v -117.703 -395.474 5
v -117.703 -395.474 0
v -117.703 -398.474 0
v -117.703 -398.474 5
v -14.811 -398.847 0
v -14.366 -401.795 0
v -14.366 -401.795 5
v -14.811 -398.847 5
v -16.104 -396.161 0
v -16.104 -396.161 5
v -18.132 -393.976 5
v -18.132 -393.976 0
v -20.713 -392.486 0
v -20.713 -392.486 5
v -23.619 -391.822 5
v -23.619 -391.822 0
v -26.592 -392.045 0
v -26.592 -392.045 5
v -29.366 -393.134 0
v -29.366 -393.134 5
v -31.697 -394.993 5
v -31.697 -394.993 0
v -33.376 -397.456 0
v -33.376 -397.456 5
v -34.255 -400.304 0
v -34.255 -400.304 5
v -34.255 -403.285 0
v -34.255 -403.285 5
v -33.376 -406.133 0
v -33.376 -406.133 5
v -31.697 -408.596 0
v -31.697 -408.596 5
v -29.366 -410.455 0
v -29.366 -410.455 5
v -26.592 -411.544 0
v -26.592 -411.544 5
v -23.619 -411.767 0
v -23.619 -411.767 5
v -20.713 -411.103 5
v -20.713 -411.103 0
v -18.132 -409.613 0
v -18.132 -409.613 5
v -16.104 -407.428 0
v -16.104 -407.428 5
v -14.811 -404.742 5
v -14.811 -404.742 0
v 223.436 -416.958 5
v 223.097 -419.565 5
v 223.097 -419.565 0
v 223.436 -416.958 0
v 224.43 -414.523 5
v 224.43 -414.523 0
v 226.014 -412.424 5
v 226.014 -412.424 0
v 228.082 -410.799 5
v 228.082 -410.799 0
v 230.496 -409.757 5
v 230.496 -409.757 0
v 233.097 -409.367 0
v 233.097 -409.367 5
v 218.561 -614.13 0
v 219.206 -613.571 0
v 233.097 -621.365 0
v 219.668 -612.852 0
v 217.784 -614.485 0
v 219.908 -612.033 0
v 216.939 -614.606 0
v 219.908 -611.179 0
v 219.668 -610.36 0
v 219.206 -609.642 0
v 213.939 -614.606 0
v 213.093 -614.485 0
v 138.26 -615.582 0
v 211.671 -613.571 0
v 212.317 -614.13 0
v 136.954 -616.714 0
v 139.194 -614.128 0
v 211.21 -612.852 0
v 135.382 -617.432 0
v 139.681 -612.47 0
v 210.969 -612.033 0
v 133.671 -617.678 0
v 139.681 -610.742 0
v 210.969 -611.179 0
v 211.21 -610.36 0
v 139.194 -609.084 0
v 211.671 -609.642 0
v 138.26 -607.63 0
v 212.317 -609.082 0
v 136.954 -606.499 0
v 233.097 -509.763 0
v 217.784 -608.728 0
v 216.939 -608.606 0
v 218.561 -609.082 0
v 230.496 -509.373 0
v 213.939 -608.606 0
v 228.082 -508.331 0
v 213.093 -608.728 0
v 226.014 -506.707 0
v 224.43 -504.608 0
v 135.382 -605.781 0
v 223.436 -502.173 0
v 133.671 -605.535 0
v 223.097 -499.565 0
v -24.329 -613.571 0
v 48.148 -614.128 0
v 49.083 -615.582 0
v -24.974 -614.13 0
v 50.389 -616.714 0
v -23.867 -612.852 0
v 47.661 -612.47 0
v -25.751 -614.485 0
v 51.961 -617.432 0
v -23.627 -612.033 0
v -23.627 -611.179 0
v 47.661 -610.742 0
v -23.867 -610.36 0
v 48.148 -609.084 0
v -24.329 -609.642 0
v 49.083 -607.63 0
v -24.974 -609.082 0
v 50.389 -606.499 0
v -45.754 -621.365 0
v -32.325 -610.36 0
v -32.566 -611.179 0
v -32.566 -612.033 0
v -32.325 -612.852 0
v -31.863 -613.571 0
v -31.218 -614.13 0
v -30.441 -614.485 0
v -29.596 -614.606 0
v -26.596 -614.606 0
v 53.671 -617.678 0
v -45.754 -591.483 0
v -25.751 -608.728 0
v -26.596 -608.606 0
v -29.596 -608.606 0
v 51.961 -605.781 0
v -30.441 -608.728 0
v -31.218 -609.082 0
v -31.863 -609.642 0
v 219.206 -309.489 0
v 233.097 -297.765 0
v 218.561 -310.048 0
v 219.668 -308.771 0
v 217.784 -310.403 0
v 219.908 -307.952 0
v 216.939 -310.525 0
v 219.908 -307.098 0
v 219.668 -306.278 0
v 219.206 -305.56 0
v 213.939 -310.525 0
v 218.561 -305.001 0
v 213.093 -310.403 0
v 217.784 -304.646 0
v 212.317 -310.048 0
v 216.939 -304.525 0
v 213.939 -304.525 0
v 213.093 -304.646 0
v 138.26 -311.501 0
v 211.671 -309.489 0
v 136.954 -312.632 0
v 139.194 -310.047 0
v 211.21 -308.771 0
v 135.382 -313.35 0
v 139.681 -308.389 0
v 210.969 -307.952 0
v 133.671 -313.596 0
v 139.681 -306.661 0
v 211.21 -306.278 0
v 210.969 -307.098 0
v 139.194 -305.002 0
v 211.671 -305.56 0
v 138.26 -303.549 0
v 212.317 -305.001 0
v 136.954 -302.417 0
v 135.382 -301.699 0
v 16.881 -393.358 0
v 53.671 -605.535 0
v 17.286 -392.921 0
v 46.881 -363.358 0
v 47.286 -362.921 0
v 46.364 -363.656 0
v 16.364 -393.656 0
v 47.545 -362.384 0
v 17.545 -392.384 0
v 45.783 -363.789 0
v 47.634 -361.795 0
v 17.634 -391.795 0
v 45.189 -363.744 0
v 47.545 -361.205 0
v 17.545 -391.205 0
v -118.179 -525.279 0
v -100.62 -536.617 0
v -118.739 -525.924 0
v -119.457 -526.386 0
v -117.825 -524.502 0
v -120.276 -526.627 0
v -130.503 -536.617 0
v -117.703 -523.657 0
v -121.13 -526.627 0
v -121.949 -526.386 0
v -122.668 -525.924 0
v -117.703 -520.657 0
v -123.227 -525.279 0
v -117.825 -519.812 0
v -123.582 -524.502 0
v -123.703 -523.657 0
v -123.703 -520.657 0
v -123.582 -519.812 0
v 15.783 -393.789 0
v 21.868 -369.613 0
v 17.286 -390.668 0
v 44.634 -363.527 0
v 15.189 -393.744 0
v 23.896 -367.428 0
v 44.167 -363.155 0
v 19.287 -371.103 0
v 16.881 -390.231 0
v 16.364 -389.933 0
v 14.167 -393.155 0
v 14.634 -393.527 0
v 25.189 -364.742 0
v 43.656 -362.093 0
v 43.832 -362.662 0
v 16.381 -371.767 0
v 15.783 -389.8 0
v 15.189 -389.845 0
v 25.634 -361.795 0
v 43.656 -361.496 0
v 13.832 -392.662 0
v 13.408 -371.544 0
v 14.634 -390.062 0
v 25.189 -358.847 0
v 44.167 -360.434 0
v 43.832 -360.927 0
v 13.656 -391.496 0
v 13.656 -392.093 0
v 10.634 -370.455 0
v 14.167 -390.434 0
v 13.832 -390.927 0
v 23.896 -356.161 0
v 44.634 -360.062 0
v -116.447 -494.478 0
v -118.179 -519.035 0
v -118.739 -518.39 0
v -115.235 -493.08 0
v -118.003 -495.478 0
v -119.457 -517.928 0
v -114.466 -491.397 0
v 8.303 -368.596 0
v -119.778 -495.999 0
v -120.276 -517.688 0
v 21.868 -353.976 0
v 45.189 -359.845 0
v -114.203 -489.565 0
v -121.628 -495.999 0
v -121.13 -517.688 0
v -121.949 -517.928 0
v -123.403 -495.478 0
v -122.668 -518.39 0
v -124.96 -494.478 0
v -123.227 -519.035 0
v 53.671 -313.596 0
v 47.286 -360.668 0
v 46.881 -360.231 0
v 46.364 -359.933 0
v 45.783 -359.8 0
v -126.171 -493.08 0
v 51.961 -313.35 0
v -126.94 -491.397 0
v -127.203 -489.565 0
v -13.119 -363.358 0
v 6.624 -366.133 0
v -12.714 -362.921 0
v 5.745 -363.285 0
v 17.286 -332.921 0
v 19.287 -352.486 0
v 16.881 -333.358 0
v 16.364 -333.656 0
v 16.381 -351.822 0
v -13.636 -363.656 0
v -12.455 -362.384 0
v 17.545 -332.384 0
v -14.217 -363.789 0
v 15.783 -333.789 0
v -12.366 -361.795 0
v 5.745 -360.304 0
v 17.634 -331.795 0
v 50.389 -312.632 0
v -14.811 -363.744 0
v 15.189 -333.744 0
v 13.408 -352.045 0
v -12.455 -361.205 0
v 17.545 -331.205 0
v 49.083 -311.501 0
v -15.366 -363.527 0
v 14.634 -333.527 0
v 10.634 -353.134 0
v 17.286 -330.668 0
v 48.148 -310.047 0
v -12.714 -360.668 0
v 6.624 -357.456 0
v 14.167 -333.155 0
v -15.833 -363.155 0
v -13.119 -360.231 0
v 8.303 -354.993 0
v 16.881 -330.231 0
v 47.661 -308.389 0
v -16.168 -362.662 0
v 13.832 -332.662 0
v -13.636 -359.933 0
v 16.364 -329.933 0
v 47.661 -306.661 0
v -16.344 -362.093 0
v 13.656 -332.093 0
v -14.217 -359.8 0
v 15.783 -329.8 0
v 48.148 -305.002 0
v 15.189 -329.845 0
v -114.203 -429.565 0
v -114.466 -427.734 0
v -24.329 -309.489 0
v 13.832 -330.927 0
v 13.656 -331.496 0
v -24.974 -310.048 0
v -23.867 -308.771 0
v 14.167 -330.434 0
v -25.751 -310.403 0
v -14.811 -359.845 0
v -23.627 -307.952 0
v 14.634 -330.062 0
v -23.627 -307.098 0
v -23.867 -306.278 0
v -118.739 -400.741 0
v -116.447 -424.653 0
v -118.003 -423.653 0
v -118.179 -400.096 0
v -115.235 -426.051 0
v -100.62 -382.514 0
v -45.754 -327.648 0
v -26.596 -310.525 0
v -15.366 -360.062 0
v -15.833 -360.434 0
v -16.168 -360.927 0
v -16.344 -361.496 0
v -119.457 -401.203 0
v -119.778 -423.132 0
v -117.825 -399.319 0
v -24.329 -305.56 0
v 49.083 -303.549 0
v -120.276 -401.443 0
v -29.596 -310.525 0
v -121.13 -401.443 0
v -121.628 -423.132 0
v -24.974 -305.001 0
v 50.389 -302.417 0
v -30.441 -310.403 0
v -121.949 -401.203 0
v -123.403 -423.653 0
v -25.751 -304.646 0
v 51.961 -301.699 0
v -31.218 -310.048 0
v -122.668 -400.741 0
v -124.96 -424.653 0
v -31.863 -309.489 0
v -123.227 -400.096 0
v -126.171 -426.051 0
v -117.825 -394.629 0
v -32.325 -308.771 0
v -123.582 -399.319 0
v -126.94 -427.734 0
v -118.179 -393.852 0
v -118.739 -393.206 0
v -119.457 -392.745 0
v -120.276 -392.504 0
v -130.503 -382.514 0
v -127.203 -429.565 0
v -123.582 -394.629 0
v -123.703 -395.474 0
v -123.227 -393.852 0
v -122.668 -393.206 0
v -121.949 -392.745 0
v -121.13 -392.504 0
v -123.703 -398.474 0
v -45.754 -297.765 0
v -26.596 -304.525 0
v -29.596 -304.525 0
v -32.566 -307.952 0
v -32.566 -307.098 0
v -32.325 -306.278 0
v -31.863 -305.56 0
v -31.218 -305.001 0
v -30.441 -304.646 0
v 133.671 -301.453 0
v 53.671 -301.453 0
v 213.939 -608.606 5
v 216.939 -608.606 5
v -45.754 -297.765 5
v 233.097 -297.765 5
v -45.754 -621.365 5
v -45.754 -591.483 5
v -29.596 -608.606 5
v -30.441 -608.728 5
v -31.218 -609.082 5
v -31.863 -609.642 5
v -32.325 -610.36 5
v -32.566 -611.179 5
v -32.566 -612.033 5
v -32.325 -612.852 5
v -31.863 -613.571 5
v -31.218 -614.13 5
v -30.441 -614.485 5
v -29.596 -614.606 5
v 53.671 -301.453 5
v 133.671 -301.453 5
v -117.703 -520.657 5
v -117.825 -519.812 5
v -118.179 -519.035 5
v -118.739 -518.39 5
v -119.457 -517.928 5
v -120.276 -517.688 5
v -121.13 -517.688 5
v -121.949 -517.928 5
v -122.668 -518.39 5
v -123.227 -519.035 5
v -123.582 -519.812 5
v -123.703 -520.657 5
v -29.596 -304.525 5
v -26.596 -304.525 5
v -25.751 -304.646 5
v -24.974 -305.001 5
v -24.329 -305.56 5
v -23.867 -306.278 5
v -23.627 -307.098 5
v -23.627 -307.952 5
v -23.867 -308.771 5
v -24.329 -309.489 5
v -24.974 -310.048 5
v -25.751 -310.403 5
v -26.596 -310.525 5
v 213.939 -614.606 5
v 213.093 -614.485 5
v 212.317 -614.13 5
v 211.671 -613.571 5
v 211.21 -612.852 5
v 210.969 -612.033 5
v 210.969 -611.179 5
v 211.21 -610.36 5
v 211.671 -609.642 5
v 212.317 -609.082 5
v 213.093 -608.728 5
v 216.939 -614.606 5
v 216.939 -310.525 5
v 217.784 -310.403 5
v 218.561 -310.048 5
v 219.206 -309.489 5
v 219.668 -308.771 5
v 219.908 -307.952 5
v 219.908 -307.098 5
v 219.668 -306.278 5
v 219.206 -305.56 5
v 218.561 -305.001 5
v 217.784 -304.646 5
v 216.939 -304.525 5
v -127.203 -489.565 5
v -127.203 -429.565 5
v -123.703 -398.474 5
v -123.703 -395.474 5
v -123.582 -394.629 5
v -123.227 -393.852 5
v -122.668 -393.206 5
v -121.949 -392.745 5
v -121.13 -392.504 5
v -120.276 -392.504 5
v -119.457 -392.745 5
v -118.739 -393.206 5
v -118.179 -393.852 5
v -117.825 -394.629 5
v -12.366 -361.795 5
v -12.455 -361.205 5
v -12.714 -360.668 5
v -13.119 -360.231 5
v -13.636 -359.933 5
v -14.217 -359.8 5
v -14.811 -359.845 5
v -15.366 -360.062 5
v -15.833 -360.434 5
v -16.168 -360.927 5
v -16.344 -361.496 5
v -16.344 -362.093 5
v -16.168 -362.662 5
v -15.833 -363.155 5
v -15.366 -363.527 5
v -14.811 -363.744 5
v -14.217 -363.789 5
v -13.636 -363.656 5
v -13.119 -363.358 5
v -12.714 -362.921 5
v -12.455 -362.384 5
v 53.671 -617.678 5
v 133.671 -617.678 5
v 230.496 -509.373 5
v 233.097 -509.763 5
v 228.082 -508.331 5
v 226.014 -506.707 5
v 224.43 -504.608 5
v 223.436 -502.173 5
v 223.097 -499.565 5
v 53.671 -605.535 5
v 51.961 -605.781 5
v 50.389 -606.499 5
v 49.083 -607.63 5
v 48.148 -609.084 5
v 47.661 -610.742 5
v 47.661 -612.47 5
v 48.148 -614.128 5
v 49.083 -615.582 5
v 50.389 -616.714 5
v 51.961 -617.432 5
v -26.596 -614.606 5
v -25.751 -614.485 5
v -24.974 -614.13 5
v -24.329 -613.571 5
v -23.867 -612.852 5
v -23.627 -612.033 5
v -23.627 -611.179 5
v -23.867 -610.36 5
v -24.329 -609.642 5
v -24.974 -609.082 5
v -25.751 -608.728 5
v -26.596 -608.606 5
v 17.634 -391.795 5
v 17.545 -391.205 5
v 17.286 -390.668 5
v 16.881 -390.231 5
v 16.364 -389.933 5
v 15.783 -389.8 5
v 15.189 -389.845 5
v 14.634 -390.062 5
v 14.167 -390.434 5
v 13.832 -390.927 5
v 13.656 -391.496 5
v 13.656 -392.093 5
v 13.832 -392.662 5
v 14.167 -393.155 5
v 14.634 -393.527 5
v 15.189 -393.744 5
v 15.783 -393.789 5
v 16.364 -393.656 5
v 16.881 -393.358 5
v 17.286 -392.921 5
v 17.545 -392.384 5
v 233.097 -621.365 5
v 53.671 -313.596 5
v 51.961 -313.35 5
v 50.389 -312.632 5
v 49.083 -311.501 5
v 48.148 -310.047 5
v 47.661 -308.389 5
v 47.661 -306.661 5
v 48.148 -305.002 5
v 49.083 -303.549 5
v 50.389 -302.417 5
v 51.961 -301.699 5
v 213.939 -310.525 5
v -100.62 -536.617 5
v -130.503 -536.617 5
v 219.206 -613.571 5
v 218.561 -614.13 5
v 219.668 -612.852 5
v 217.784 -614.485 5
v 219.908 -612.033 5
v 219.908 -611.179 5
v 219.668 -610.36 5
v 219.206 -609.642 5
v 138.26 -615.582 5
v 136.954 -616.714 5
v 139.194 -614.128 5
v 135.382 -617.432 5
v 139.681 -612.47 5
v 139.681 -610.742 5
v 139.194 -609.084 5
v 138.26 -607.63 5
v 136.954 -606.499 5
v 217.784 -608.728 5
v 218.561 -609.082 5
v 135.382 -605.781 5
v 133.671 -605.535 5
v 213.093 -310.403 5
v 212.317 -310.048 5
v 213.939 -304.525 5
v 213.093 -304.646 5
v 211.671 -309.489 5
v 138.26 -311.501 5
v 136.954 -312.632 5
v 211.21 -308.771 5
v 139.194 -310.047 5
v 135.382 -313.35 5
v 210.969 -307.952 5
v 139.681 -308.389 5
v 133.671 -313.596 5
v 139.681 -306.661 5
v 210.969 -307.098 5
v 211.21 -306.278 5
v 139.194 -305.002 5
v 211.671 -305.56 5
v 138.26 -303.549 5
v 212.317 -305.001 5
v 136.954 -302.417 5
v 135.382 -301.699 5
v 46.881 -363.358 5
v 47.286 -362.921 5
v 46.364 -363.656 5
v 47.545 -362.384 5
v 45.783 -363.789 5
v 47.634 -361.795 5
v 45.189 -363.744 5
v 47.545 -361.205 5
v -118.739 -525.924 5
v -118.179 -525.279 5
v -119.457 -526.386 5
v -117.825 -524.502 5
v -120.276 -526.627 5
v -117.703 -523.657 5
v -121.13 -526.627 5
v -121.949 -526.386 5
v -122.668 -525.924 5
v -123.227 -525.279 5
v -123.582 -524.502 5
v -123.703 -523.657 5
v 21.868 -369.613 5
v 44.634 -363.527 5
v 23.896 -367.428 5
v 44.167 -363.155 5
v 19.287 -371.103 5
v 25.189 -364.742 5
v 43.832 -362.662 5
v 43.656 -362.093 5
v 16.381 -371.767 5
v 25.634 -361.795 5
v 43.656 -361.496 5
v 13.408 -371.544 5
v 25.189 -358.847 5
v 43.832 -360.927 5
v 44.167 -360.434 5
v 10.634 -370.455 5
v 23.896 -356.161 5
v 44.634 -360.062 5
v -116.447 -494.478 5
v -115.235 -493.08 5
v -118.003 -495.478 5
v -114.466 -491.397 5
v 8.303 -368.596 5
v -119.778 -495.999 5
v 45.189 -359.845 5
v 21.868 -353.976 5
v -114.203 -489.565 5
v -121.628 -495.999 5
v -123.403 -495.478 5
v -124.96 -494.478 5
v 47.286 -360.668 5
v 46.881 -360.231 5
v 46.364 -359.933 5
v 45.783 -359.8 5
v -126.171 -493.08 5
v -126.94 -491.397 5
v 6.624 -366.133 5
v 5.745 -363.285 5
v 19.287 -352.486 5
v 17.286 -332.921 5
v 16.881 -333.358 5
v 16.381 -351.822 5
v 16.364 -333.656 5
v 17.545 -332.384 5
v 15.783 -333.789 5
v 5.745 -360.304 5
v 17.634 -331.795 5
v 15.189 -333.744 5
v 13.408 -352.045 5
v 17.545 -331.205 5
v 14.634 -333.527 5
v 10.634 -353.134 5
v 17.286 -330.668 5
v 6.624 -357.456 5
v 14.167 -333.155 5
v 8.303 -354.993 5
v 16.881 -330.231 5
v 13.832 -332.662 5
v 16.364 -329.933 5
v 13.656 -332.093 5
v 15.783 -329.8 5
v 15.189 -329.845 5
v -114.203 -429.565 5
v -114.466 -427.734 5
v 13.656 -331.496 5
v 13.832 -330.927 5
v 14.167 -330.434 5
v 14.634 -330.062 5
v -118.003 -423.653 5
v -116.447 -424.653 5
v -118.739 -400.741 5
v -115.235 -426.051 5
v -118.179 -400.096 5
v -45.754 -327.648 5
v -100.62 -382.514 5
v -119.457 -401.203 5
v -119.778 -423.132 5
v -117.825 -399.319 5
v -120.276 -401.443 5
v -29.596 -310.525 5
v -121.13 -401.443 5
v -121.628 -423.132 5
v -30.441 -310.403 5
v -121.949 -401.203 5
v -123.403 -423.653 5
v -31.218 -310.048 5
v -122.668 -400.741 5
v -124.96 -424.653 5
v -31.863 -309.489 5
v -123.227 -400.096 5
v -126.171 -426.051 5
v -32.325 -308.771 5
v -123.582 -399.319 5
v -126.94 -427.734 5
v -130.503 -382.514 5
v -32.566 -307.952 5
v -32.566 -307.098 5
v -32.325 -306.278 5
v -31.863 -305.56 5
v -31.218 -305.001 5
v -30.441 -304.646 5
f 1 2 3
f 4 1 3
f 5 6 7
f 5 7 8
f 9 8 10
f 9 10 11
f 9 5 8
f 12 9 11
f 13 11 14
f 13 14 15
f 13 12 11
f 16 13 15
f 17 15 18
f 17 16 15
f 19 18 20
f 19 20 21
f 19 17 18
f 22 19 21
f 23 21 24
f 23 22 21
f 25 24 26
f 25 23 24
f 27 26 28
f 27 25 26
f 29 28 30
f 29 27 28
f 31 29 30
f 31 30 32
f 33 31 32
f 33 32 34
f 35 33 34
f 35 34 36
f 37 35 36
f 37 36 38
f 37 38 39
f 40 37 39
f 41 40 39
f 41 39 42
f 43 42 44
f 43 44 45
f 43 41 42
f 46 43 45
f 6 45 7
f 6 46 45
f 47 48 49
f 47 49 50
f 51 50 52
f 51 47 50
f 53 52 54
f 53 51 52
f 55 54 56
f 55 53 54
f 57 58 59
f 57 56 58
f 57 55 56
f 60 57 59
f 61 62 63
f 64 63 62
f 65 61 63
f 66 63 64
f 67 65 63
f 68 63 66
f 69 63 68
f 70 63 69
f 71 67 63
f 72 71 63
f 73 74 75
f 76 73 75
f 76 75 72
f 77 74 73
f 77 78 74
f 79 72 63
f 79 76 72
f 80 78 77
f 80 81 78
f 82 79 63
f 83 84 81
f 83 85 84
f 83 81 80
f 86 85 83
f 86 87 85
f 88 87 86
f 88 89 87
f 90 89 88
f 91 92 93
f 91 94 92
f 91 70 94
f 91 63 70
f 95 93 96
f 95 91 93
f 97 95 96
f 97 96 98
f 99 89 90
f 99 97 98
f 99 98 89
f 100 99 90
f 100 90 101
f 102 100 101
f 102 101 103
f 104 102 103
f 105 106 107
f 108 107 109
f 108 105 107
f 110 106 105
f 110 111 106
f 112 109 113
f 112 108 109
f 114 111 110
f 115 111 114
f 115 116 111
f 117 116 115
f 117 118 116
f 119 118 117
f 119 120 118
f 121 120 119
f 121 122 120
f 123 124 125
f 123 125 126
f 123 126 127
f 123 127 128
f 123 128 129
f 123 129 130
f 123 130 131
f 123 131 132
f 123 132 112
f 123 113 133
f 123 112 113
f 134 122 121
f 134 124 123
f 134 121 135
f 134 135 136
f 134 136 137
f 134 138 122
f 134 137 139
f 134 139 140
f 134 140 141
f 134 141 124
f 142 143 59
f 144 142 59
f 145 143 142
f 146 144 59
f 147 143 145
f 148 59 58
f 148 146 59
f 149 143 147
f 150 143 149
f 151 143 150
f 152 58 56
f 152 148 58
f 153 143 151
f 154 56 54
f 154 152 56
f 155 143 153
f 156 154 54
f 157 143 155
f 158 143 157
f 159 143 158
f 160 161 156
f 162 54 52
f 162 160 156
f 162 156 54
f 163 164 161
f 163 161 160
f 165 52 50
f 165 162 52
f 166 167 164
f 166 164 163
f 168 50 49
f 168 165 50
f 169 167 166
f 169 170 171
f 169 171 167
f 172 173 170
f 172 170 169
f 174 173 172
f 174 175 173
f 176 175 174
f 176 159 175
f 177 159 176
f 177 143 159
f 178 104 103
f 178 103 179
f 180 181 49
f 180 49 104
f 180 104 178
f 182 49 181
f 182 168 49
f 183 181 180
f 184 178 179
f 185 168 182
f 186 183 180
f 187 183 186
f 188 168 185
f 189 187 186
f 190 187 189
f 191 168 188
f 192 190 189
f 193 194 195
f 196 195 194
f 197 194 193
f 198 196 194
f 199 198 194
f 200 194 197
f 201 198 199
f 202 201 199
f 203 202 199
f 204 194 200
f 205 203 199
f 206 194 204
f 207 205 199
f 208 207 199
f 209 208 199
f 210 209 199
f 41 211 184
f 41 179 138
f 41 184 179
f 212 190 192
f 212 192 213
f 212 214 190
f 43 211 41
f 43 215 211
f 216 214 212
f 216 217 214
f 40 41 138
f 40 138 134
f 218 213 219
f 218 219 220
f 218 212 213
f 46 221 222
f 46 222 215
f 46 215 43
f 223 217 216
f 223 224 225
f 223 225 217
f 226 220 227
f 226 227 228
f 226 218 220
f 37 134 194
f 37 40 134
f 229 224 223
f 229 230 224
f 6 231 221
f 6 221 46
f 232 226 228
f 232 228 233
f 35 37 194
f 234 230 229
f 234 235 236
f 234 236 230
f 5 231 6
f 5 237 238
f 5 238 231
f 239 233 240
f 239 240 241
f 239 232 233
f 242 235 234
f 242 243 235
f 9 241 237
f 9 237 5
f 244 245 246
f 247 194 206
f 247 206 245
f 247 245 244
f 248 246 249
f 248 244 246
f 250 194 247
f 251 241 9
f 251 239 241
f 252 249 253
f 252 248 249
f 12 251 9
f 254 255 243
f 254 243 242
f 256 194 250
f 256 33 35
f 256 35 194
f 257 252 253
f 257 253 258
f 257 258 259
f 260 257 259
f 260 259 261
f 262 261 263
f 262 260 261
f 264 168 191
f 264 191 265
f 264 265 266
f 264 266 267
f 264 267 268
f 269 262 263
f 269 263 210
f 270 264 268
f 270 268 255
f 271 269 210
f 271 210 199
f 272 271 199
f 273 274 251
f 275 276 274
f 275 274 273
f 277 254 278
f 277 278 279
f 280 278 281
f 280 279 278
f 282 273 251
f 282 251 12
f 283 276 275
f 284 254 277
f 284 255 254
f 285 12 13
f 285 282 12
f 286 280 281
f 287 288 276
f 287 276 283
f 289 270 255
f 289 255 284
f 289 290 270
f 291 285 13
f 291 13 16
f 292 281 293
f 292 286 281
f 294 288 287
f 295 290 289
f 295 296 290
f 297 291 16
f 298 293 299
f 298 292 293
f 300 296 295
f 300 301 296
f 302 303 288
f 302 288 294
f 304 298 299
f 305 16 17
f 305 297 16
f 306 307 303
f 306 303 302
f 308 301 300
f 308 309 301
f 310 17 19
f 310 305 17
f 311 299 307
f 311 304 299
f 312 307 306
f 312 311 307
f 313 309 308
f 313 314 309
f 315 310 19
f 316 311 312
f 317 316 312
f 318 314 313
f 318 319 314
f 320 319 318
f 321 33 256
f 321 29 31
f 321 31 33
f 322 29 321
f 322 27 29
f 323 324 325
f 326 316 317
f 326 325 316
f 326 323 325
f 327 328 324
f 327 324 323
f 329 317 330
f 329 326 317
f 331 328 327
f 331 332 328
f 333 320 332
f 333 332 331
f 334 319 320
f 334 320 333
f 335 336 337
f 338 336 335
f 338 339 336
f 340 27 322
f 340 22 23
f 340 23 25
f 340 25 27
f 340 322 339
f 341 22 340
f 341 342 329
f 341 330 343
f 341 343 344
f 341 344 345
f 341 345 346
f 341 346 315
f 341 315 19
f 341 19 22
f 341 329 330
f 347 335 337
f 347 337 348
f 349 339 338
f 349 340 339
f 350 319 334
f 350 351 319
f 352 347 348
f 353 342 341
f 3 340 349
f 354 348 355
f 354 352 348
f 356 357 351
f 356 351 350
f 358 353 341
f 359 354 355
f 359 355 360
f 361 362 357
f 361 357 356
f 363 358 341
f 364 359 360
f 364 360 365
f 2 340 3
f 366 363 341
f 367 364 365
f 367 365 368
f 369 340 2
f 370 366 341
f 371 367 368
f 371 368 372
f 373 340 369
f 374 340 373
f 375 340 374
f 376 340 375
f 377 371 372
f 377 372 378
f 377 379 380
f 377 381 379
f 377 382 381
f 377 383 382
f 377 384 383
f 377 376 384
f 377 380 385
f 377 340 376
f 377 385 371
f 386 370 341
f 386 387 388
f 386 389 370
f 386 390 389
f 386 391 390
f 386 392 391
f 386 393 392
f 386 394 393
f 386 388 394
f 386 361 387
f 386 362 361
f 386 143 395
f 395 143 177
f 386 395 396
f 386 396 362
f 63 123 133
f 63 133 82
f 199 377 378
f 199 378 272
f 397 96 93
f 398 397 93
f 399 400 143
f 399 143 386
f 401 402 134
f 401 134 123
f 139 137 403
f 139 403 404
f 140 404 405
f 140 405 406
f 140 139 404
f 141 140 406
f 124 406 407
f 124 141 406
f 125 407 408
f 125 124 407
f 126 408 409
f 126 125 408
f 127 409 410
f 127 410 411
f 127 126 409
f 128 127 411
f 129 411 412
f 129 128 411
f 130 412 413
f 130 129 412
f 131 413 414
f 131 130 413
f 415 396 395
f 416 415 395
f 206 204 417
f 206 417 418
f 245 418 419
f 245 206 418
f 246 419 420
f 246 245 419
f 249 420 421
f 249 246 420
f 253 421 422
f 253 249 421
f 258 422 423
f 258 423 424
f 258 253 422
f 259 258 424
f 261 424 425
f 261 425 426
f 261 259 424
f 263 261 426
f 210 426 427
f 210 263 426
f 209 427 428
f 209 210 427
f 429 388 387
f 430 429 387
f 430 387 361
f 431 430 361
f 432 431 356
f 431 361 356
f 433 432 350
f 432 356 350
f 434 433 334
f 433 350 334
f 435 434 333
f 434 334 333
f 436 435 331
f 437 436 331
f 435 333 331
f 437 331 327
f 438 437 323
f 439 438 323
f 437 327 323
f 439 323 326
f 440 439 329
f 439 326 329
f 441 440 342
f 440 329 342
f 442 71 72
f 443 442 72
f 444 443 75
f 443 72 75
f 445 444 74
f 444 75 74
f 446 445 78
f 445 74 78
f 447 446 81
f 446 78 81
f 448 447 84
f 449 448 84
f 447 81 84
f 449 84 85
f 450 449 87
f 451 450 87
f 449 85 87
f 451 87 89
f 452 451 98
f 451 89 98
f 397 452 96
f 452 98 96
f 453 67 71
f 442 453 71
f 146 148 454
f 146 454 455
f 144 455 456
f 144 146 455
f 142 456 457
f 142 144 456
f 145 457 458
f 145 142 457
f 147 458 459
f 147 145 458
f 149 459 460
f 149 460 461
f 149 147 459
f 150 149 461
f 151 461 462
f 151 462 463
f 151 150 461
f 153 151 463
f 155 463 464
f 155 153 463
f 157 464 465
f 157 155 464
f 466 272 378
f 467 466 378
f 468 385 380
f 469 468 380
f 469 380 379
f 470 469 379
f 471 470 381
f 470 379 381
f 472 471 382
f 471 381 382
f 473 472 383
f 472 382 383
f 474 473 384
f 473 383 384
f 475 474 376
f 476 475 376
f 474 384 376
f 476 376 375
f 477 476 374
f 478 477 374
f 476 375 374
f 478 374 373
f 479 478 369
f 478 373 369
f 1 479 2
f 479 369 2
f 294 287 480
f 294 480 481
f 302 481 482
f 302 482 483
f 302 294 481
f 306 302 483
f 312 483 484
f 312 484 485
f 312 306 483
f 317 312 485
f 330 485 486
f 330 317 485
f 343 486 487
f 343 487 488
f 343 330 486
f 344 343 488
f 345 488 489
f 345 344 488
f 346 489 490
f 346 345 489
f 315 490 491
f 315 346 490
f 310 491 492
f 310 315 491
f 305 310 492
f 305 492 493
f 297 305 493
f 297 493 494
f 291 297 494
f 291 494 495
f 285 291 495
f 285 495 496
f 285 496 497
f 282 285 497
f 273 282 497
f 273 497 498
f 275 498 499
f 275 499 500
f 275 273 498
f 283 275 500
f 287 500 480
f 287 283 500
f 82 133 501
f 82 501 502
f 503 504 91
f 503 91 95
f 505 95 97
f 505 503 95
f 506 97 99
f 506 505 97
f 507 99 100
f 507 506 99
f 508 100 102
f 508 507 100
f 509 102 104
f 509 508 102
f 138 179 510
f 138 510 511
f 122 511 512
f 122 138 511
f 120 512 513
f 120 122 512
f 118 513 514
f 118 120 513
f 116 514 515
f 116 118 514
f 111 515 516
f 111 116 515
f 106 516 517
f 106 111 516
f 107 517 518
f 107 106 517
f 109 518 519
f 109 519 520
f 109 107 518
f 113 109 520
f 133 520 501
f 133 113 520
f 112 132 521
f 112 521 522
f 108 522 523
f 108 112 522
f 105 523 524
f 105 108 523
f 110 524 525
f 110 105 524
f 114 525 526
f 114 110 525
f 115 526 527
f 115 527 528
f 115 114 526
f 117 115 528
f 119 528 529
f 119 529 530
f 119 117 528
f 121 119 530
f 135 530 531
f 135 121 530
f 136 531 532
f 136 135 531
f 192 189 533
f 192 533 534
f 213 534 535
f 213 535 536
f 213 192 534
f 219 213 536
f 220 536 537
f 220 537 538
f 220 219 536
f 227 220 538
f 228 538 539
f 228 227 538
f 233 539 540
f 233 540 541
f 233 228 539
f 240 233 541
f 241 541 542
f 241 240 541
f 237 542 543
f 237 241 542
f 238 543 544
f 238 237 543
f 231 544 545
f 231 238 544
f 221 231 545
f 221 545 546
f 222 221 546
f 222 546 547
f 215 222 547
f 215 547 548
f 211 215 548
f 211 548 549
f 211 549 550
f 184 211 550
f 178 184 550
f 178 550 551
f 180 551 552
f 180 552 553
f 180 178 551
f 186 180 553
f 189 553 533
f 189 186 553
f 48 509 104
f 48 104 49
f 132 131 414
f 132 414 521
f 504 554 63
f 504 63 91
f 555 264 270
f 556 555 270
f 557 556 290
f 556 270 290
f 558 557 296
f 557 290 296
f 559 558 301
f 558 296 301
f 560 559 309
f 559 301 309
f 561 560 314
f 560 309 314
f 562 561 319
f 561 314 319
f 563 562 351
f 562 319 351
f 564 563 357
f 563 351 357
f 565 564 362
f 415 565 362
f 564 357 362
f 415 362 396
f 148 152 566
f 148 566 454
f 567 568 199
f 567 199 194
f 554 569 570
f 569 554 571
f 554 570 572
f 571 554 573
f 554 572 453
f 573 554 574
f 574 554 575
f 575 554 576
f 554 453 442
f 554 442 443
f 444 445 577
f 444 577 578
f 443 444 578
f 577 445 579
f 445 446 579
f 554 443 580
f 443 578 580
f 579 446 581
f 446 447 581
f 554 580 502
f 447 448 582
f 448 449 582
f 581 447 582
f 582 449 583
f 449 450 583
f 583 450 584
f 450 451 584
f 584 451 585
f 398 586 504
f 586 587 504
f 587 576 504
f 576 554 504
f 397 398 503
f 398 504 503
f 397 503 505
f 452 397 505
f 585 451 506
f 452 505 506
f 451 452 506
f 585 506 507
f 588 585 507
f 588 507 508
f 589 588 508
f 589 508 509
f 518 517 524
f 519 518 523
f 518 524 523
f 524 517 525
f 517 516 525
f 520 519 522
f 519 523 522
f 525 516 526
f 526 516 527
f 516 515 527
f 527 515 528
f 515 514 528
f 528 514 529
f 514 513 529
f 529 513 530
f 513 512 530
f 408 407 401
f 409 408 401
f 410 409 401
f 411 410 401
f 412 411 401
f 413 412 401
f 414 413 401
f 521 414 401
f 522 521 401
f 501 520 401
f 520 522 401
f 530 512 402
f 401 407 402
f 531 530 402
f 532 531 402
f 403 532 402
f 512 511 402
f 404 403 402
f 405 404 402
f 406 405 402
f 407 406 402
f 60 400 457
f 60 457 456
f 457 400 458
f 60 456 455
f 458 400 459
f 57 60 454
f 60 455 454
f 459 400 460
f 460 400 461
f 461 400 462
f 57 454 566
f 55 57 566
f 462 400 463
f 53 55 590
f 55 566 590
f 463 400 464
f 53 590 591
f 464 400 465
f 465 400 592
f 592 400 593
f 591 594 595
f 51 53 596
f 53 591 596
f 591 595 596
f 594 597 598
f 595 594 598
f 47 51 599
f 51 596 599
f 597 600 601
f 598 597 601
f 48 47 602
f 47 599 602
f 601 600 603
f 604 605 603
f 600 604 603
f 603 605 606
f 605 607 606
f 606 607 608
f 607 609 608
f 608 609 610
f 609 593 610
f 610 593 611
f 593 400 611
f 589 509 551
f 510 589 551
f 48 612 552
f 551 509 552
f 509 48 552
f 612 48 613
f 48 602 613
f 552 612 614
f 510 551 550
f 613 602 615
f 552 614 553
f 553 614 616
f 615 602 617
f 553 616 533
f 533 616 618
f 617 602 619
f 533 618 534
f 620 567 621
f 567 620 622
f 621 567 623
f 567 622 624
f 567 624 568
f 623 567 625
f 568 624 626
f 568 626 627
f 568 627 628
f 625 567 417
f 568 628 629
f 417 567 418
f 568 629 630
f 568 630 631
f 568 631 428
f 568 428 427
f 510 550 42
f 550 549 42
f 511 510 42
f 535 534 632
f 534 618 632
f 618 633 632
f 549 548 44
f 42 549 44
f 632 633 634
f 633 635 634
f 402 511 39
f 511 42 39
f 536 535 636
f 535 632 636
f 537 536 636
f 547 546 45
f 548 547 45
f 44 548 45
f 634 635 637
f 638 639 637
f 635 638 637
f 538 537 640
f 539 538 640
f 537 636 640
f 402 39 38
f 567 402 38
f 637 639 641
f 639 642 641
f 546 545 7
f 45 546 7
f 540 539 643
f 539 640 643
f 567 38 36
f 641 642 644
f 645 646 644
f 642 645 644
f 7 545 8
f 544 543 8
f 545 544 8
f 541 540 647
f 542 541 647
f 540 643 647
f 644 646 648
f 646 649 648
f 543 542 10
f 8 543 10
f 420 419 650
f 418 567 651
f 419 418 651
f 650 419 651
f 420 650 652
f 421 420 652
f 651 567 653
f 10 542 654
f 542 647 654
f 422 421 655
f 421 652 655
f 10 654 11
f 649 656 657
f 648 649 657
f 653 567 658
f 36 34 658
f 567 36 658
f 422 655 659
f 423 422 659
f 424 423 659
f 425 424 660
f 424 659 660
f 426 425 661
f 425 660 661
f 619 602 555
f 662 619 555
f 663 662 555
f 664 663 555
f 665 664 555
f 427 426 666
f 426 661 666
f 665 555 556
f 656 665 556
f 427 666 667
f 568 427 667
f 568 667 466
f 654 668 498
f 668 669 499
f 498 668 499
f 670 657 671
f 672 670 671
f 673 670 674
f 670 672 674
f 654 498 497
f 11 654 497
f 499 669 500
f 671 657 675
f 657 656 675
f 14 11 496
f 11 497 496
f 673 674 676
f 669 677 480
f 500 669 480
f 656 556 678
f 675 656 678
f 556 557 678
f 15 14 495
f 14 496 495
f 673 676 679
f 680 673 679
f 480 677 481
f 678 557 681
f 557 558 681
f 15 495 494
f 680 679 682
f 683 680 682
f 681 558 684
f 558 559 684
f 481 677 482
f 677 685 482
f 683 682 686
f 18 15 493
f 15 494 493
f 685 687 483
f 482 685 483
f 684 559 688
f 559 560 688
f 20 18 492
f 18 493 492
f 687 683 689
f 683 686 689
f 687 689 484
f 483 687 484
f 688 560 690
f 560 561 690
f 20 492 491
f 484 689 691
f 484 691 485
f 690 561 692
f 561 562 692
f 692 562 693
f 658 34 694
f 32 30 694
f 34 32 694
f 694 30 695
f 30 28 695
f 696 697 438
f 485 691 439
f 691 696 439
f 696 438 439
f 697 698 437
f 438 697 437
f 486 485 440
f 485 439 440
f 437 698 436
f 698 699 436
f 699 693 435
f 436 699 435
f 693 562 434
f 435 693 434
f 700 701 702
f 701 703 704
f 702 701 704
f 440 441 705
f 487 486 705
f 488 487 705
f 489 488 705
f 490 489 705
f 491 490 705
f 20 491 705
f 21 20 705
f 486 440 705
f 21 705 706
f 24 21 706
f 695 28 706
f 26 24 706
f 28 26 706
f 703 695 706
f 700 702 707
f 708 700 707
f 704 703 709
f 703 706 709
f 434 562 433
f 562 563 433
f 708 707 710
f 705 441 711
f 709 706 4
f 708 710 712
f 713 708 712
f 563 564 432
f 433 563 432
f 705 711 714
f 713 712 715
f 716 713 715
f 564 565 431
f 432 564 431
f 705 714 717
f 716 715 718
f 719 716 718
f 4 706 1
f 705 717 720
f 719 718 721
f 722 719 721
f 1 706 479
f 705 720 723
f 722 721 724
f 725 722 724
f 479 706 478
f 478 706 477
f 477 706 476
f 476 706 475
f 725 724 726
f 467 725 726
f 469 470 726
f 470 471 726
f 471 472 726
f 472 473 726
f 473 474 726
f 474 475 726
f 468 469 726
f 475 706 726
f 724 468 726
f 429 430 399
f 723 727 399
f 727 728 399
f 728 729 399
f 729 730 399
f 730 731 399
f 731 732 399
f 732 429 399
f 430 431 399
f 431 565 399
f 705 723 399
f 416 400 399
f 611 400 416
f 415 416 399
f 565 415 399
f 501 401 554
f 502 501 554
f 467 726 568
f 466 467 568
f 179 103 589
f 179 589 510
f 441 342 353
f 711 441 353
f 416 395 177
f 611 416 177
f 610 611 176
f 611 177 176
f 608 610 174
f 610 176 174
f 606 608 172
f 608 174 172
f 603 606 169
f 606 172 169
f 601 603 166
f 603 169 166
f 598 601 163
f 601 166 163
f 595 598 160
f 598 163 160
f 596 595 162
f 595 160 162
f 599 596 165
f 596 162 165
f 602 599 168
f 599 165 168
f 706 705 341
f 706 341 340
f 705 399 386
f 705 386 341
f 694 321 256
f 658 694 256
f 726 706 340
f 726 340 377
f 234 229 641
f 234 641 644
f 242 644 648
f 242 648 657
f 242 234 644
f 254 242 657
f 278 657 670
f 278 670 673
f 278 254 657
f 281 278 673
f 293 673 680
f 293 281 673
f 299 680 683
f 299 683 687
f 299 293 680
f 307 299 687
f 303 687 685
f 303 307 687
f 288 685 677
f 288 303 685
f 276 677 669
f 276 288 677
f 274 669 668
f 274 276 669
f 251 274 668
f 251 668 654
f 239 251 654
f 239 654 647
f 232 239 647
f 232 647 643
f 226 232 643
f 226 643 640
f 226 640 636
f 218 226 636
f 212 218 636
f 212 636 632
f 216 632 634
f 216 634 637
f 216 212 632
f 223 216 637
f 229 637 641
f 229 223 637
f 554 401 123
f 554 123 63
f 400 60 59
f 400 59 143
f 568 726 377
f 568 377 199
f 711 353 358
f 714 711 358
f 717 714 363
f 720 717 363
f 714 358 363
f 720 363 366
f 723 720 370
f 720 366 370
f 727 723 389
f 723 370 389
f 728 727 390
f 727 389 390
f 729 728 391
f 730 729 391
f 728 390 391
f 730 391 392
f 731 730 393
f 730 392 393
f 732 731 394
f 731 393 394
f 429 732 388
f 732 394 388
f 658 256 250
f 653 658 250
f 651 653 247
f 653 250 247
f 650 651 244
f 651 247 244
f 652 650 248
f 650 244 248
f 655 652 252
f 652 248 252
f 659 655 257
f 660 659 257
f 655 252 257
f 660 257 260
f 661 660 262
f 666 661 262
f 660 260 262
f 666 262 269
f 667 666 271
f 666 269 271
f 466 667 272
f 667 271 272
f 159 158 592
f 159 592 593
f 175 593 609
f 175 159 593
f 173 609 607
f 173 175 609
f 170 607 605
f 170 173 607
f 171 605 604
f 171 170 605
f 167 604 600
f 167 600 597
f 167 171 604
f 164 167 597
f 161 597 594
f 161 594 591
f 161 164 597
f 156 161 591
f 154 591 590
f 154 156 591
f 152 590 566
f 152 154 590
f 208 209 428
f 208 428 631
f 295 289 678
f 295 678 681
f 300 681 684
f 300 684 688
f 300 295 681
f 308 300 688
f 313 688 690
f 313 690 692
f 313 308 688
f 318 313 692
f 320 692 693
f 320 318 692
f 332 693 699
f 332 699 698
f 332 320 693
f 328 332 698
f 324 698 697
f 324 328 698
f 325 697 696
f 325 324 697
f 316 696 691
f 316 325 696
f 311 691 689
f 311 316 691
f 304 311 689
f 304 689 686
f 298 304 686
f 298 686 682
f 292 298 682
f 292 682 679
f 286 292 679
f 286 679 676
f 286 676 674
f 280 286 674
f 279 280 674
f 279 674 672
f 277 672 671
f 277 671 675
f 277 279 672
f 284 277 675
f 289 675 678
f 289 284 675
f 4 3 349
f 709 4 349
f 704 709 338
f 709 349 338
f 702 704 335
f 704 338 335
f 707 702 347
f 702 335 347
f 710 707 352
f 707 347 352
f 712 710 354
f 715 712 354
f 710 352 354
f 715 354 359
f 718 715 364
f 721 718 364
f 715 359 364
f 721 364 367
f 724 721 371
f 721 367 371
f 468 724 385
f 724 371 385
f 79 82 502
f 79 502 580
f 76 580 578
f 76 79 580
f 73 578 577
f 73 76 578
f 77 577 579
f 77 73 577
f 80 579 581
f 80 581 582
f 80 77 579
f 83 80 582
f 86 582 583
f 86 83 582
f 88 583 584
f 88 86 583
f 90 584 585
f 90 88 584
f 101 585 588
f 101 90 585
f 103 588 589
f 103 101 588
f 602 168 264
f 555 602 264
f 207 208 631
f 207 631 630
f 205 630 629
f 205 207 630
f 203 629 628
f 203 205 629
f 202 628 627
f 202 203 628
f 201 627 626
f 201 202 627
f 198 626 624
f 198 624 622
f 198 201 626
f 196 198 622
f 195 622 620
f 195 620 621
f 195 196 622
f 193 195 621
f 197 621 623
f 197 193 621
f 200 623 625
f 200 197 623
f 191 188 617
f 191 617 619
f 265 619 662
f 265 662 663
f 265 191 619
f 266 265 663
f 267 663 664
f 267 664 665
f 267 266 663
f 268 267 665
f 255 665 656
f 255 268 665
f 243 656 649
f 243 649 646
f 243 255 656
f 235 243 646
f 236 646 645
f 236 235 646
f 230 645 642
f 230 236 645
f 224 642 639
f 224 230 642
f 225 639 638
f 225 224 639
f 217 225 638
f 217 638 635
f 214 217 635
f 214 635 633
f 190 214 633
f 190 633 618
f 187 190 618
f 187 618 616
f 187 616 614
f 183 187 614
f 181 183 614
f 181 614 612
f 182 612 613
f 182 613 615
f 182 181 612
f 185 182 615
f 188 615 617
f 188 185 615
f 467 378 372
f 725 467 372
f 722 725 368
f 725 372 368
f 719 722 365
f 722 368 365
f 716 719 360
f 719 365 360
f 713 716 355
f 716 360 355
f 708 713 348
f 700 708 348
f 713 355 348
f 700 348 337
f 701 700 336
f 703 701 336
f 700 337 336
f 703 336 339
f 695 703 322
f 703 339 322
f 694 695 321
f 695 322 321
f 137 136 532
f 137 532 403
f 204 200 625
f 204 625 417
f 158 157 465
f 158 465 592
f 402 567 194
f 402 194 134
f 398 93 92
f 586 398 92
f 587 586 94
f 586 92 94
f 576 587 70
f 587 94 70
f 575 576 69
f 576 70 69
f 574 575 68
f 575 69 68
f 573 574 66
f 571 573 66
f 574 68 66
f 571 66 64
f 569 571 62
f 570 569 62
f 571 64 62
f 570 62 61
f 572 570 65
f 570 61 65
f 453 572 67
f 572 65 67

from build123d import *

# Parameters (mm, degrees)
SKETCH2_R           = 2
SKETCH2_R_2         = 10
BOSS_EXTRUDE6_DEPTH = 5
CUT_EXTRUDE9_DEPTH  = 10


with BuildPart() as part:
    # Sketch2 → Boss-Extrude6 (new body)
    with BuildSketch(Plane.XY):
        with BuildLine():
            Line((-130.703145502, -382.314175973), (-100.703145502, -382.314175973))
            Line((-100.703145502, -382.314175973), (-45.95440816, -327.565438631))
            Line((-45.95440816, -327.565438631), (-45.95440816, -297.565438631))
            Line((-45.95440816, -297.565438631), (233.296854498, -297.565438631))
            Line((233.296854498, -297.565438631), (233.296854498, -409.565438631))
            ThreePointArc((233.296854498, -409.565438631), (226.225786687, -412.494370819), (223.296854498, -419.565438631))
            Line((223.296854498, -419.565438631), (223.296854498, -499.565438631))
            ThreePointArc((223.296854498, -499.565438631), (226.225786687, -506.636506443), (233.296854498, -509.565438631))
            Line((233.296854498, -509.565438631), (233.296854498, -621.565438631))
            Line((233.296854498, -621.565438631), (-45.95440816, -621.565438631))
            Line((-45.95440816, -621.565438631), (-45.95440816, -591.565438631))
            Line((-45.95440816, -591.565438631), (-100.703145502, -536.81670129))
            Line((-100.703145502, -536.81670129), (-130.703145502, -536.81670129))
            Line((-130.703145502, -536.81670129), (-130.703145502, -382.314175973))
        make_face()
        with Locations((15.633601358, -331.79452168)):
            Circle(SKETCH2_R, mode=Mode.SUBTRACT)
        with Locations((-14.366398642, -361.79452168)):
            Circle(SKETCH2_R, mode=Mode.SUBTRACT)
        with Locations((15.633601358, -391.79452168)):
            Circle(SKETCH2_R, mode=Mode.SUBTRACT)
        with Locations((45.633601358, -361.79452168)):
            Circle(SKETCH2_R, mode=Mode.SUBTRACT)
        with Locations((15.633601358, -361.79452168)):
            Circle(SKETCH2_R_2, mode=Mode.SUBTRACT)
        with Locations((-24.366398642, -401.79452168)):
            Circle(SKETCH2_R_2, mode=Mode.SUBTRACT)
        with BuildLine():
            Line((-29.596250394, -304.524677965), (-26.596250394, -304.524677965))
            ThreePointArc((-26.596250394, -304.524677965), (-23.596250394, -307.524677965), (-26.596250394, -310.524677965))
            Line((-26.596250394, -310.524677965), (-29.596250394, -310.524677965))
            ThreePointArc((-29.596250394, -310.524677965), (-32.596250394, -307.524677965), (-29.596250394, -304.524677965))
        make_face(mode=Mode.SUBTRACT)
        with BuildLine():
            Line((-114.203145502, -429.565438631), (-114.203145502, -489.565438631))
            ThreePointArc((-114.203145502, -489.565438631), (-120.703145502, -496.065438631), (-127.203145502, -489.565438631))
            Line((-127.203145502, -489.565438631), (-127.203145502, -429.565438631))
            ThreePointArc((-127.203145502, -429.565438631), (-120.703145502, -423.065438631), (-114.203145502, -429.565438631))
        make_face(mode=Mode.SUBTRACT)
        with BuildLine():
            Line((216.938696732, -304.524677965), (213.938696732, -304.524677965))
            ThreePointArc((213.938696732, -304.524677965), (210.938696732, -307.524677965), (213.938696732, -310.524677965))
            Line((213.938696732, -310.524677965), (216.938696732, -310.524677965))
            ThreePointArc((216.938696732, -310.524677965), (219.938696732, -307.524677965), (216.938696732, -304.524677965))
        make_face(mode=Mode.SUBTRACT)
        with BuildLine():
            Line((216.938696732, -614.606199297), (213.938696732, -614.606199297))
            ThreePointArc((213.938696732, -614.606199297), (210.938696732, -611.606199297), (213.938696732, -608.606199297))
            Line((213.938696732, -608.606199297), (216.938696732, -608.606199297))
            ThreePointArc((216.938696732, -608.606199297), (219.938696732, -611.606199297), (216.938696732, -614.606199297))
        make_face(mode=Mode.SUBTRACT)
        with BuildLine():
            Line((-29.596250394, -614.606199297), (-26.596250394, -614.606199297))
            ThreePointArc((-26.596250394, -614.606199297), (-23.596250394, -611.606199297), (-26.596250394, -608.606199297))
            Line((-26.596250394, -608.606199297), (-29.596250394, -608.606199297))
            ThreePointArc((-29.596250394, -608.606199297), (-32.596250394, -611.606199297), (-29.596250394, -614.606199297))
        make_face(mode=Mode.SUBTRACT)
        with BuildLine():
            Line((-117.703145502, -395.473744081), (-117.703145502, -398.473744081))
            ThreePointArc((-117.703145502, -398.473744081), (-120.703145502, -401.473744081), (-123.703145502, -398.473744081))
            Line((-123.703145502, -398.473744081), (-123.703145502, -395.473744081))
            ThreePointArc((-123.703145502, -395.473744081), (-120.703145502, -392.473744081), (-117.703145502, -395.473744081))
        make_face(mode=Mode.SUBTRACT)
        with BuildLine():
            Line((53.671223169, -301.453147058), (133.671223169, -301.453147058))
            ThreePointArc((133.671223169, -301.453147058), (139.742754077, -307.524677965), (133.671223169, -313.596208873))
            Line((133.671223169, -313.596208873), (53.671223169, -313.596208873))
            ThreePointArc((53.671223169, -313.596208873), (47.599692262, -307.524677965), (53.671223169, -301.453147058))
        make_face(mode=Mode.SUBTRACT)
        with BuildLine():
            Line((-117.703145502, -523.657133181), (-117.703145502, -520.657133181))
            ThreePointArc((-117.703145502, -520.657133181), (-120.703145502, -517.657133181), (-123.703145502, -520.657133181))
            Line((-123.703145502, -520.657133181), (-123.703145502, -523.657133181))
            ThreePointArc((-123.703145502, -523.657133181), (-120.703145502, -526.657133181), (-117.703145502, -523.657133181))
        make_face(mode=Mode.SUBTRACT)
        with BuildLine():
            Line((53.671223169, -617.677730205), (133.671223169, -617.677730205))
            ThreePointArc((133.671223169, -617.677730205), (139.742754077, -611.606199297), (133.671223169, -605.534668389))
            Line((133.671223169, -605.534668389), (53.671223169, -605.534668389))
            ThreePointArc((53.671223169, -605.534668389), (47.599692262, -611.606199297), (53.671223169, -617.677730205))
        make_face(mode=Mode.SUBTRACT)
    extrude(amount=BOSS_EXTRUDE6_DEPTH)

    # Sketch5 → Cut-Extrude9 (cut)
    with BuildSketch(Plane.XY.offset(5)):
        with BuildLine():
            Line((-130.703145502, -382.314175973), (-130.703145502, -536.81670129))
            Line((-130.703145502, -536.81670129), (-100.703145502, -536.81670129))
            Line((-100.703145502, -536.81670129), (-45.95440816, -591.565438631))
            Line((-45.95440816, -591.565438631), (-45.95440816, -621.565438631))
            Line((-45.95440816, -621.565438631), (233.296854498, -621.565438631))
            Line((233.296854498, -621.565438631), (233.296854498, -509.565438631))
            ThreePointArc((233.296854498, -509.565438631), (226.225786687, -506.636506443), (223.296854498, -499.565438631))
            Line((223.296854498, -499.565438631), (223.296854498, -419.565438631))
            ThreePointArc((223.296854498, -419.565438631), (226.225786687, -412.494370819), (233.296854498, -409.565438631))
            Line((233.296854498, -409.565438631), (233.296854498, -297.565438631))
            Line((233.296854498, -297.565438631), (-45.95440816, -297.565438631))
            Line((-45.95440816, -297.565438631), (-45.95440816, -327.565438631))
            Line((-45.95440816, -327.565438631), (-100.703145502, -382.314175973))
            Line((-100.703145502, -382.314175973), (-130.703145502, -382.314175973))
        make_face()
        with BuildLine():
            Line((-45.75440816, -327.648281344), (-100.620302789, -382.514175973))
            Line((-100.620302789, -382.514175973), (-130.503145502, -382.514175973))
            Line((-130.503145502, -382.514175973), (-130.503145502, -536.61670129))
            Line((-130.503145502, -536.61670129), (-100.620302789, -536.61670129))
            Line((-100.620302789, -536.61670129), (-45.75440816, -591.482595919))
            Line((-45.75440816, -591.482595919), (-45.75440816, -621.365438631))
            Line((-45.75440816, -621.365438631), (233.096854498, -621.365438631))
            Line((233.096854498, -621.365438631), (233.096854498, -509.763477658))
            ThreePointArc((233.096854498, -509.763477658), (226.013997916, -506.70686706), (223.096854498, -499.565438631))
            Line((223.096854498, -499.565438631), (223.096854498, -419.565438631))
            ThreePointArc((223.096854498, -419.565438631), (226.013997916, -412.424010203), (233.096854498, -409.367399604))
            Line((233.096854498, -409.367399604), (233.096854498, -297.765438631))
            Line((233.096854498, -297.765438631), (-45.75440816, -297.765438631))
            Line((-45.75440816, -297.765438631), (-45.75440816, -327.648281344))
        make_face(mode=Mode.SUBTRACT)
    extrude(amount=-CUT_EXTRUDE9_DEPTH, mode=Mode.SUBTRACT)


solid = part.part
